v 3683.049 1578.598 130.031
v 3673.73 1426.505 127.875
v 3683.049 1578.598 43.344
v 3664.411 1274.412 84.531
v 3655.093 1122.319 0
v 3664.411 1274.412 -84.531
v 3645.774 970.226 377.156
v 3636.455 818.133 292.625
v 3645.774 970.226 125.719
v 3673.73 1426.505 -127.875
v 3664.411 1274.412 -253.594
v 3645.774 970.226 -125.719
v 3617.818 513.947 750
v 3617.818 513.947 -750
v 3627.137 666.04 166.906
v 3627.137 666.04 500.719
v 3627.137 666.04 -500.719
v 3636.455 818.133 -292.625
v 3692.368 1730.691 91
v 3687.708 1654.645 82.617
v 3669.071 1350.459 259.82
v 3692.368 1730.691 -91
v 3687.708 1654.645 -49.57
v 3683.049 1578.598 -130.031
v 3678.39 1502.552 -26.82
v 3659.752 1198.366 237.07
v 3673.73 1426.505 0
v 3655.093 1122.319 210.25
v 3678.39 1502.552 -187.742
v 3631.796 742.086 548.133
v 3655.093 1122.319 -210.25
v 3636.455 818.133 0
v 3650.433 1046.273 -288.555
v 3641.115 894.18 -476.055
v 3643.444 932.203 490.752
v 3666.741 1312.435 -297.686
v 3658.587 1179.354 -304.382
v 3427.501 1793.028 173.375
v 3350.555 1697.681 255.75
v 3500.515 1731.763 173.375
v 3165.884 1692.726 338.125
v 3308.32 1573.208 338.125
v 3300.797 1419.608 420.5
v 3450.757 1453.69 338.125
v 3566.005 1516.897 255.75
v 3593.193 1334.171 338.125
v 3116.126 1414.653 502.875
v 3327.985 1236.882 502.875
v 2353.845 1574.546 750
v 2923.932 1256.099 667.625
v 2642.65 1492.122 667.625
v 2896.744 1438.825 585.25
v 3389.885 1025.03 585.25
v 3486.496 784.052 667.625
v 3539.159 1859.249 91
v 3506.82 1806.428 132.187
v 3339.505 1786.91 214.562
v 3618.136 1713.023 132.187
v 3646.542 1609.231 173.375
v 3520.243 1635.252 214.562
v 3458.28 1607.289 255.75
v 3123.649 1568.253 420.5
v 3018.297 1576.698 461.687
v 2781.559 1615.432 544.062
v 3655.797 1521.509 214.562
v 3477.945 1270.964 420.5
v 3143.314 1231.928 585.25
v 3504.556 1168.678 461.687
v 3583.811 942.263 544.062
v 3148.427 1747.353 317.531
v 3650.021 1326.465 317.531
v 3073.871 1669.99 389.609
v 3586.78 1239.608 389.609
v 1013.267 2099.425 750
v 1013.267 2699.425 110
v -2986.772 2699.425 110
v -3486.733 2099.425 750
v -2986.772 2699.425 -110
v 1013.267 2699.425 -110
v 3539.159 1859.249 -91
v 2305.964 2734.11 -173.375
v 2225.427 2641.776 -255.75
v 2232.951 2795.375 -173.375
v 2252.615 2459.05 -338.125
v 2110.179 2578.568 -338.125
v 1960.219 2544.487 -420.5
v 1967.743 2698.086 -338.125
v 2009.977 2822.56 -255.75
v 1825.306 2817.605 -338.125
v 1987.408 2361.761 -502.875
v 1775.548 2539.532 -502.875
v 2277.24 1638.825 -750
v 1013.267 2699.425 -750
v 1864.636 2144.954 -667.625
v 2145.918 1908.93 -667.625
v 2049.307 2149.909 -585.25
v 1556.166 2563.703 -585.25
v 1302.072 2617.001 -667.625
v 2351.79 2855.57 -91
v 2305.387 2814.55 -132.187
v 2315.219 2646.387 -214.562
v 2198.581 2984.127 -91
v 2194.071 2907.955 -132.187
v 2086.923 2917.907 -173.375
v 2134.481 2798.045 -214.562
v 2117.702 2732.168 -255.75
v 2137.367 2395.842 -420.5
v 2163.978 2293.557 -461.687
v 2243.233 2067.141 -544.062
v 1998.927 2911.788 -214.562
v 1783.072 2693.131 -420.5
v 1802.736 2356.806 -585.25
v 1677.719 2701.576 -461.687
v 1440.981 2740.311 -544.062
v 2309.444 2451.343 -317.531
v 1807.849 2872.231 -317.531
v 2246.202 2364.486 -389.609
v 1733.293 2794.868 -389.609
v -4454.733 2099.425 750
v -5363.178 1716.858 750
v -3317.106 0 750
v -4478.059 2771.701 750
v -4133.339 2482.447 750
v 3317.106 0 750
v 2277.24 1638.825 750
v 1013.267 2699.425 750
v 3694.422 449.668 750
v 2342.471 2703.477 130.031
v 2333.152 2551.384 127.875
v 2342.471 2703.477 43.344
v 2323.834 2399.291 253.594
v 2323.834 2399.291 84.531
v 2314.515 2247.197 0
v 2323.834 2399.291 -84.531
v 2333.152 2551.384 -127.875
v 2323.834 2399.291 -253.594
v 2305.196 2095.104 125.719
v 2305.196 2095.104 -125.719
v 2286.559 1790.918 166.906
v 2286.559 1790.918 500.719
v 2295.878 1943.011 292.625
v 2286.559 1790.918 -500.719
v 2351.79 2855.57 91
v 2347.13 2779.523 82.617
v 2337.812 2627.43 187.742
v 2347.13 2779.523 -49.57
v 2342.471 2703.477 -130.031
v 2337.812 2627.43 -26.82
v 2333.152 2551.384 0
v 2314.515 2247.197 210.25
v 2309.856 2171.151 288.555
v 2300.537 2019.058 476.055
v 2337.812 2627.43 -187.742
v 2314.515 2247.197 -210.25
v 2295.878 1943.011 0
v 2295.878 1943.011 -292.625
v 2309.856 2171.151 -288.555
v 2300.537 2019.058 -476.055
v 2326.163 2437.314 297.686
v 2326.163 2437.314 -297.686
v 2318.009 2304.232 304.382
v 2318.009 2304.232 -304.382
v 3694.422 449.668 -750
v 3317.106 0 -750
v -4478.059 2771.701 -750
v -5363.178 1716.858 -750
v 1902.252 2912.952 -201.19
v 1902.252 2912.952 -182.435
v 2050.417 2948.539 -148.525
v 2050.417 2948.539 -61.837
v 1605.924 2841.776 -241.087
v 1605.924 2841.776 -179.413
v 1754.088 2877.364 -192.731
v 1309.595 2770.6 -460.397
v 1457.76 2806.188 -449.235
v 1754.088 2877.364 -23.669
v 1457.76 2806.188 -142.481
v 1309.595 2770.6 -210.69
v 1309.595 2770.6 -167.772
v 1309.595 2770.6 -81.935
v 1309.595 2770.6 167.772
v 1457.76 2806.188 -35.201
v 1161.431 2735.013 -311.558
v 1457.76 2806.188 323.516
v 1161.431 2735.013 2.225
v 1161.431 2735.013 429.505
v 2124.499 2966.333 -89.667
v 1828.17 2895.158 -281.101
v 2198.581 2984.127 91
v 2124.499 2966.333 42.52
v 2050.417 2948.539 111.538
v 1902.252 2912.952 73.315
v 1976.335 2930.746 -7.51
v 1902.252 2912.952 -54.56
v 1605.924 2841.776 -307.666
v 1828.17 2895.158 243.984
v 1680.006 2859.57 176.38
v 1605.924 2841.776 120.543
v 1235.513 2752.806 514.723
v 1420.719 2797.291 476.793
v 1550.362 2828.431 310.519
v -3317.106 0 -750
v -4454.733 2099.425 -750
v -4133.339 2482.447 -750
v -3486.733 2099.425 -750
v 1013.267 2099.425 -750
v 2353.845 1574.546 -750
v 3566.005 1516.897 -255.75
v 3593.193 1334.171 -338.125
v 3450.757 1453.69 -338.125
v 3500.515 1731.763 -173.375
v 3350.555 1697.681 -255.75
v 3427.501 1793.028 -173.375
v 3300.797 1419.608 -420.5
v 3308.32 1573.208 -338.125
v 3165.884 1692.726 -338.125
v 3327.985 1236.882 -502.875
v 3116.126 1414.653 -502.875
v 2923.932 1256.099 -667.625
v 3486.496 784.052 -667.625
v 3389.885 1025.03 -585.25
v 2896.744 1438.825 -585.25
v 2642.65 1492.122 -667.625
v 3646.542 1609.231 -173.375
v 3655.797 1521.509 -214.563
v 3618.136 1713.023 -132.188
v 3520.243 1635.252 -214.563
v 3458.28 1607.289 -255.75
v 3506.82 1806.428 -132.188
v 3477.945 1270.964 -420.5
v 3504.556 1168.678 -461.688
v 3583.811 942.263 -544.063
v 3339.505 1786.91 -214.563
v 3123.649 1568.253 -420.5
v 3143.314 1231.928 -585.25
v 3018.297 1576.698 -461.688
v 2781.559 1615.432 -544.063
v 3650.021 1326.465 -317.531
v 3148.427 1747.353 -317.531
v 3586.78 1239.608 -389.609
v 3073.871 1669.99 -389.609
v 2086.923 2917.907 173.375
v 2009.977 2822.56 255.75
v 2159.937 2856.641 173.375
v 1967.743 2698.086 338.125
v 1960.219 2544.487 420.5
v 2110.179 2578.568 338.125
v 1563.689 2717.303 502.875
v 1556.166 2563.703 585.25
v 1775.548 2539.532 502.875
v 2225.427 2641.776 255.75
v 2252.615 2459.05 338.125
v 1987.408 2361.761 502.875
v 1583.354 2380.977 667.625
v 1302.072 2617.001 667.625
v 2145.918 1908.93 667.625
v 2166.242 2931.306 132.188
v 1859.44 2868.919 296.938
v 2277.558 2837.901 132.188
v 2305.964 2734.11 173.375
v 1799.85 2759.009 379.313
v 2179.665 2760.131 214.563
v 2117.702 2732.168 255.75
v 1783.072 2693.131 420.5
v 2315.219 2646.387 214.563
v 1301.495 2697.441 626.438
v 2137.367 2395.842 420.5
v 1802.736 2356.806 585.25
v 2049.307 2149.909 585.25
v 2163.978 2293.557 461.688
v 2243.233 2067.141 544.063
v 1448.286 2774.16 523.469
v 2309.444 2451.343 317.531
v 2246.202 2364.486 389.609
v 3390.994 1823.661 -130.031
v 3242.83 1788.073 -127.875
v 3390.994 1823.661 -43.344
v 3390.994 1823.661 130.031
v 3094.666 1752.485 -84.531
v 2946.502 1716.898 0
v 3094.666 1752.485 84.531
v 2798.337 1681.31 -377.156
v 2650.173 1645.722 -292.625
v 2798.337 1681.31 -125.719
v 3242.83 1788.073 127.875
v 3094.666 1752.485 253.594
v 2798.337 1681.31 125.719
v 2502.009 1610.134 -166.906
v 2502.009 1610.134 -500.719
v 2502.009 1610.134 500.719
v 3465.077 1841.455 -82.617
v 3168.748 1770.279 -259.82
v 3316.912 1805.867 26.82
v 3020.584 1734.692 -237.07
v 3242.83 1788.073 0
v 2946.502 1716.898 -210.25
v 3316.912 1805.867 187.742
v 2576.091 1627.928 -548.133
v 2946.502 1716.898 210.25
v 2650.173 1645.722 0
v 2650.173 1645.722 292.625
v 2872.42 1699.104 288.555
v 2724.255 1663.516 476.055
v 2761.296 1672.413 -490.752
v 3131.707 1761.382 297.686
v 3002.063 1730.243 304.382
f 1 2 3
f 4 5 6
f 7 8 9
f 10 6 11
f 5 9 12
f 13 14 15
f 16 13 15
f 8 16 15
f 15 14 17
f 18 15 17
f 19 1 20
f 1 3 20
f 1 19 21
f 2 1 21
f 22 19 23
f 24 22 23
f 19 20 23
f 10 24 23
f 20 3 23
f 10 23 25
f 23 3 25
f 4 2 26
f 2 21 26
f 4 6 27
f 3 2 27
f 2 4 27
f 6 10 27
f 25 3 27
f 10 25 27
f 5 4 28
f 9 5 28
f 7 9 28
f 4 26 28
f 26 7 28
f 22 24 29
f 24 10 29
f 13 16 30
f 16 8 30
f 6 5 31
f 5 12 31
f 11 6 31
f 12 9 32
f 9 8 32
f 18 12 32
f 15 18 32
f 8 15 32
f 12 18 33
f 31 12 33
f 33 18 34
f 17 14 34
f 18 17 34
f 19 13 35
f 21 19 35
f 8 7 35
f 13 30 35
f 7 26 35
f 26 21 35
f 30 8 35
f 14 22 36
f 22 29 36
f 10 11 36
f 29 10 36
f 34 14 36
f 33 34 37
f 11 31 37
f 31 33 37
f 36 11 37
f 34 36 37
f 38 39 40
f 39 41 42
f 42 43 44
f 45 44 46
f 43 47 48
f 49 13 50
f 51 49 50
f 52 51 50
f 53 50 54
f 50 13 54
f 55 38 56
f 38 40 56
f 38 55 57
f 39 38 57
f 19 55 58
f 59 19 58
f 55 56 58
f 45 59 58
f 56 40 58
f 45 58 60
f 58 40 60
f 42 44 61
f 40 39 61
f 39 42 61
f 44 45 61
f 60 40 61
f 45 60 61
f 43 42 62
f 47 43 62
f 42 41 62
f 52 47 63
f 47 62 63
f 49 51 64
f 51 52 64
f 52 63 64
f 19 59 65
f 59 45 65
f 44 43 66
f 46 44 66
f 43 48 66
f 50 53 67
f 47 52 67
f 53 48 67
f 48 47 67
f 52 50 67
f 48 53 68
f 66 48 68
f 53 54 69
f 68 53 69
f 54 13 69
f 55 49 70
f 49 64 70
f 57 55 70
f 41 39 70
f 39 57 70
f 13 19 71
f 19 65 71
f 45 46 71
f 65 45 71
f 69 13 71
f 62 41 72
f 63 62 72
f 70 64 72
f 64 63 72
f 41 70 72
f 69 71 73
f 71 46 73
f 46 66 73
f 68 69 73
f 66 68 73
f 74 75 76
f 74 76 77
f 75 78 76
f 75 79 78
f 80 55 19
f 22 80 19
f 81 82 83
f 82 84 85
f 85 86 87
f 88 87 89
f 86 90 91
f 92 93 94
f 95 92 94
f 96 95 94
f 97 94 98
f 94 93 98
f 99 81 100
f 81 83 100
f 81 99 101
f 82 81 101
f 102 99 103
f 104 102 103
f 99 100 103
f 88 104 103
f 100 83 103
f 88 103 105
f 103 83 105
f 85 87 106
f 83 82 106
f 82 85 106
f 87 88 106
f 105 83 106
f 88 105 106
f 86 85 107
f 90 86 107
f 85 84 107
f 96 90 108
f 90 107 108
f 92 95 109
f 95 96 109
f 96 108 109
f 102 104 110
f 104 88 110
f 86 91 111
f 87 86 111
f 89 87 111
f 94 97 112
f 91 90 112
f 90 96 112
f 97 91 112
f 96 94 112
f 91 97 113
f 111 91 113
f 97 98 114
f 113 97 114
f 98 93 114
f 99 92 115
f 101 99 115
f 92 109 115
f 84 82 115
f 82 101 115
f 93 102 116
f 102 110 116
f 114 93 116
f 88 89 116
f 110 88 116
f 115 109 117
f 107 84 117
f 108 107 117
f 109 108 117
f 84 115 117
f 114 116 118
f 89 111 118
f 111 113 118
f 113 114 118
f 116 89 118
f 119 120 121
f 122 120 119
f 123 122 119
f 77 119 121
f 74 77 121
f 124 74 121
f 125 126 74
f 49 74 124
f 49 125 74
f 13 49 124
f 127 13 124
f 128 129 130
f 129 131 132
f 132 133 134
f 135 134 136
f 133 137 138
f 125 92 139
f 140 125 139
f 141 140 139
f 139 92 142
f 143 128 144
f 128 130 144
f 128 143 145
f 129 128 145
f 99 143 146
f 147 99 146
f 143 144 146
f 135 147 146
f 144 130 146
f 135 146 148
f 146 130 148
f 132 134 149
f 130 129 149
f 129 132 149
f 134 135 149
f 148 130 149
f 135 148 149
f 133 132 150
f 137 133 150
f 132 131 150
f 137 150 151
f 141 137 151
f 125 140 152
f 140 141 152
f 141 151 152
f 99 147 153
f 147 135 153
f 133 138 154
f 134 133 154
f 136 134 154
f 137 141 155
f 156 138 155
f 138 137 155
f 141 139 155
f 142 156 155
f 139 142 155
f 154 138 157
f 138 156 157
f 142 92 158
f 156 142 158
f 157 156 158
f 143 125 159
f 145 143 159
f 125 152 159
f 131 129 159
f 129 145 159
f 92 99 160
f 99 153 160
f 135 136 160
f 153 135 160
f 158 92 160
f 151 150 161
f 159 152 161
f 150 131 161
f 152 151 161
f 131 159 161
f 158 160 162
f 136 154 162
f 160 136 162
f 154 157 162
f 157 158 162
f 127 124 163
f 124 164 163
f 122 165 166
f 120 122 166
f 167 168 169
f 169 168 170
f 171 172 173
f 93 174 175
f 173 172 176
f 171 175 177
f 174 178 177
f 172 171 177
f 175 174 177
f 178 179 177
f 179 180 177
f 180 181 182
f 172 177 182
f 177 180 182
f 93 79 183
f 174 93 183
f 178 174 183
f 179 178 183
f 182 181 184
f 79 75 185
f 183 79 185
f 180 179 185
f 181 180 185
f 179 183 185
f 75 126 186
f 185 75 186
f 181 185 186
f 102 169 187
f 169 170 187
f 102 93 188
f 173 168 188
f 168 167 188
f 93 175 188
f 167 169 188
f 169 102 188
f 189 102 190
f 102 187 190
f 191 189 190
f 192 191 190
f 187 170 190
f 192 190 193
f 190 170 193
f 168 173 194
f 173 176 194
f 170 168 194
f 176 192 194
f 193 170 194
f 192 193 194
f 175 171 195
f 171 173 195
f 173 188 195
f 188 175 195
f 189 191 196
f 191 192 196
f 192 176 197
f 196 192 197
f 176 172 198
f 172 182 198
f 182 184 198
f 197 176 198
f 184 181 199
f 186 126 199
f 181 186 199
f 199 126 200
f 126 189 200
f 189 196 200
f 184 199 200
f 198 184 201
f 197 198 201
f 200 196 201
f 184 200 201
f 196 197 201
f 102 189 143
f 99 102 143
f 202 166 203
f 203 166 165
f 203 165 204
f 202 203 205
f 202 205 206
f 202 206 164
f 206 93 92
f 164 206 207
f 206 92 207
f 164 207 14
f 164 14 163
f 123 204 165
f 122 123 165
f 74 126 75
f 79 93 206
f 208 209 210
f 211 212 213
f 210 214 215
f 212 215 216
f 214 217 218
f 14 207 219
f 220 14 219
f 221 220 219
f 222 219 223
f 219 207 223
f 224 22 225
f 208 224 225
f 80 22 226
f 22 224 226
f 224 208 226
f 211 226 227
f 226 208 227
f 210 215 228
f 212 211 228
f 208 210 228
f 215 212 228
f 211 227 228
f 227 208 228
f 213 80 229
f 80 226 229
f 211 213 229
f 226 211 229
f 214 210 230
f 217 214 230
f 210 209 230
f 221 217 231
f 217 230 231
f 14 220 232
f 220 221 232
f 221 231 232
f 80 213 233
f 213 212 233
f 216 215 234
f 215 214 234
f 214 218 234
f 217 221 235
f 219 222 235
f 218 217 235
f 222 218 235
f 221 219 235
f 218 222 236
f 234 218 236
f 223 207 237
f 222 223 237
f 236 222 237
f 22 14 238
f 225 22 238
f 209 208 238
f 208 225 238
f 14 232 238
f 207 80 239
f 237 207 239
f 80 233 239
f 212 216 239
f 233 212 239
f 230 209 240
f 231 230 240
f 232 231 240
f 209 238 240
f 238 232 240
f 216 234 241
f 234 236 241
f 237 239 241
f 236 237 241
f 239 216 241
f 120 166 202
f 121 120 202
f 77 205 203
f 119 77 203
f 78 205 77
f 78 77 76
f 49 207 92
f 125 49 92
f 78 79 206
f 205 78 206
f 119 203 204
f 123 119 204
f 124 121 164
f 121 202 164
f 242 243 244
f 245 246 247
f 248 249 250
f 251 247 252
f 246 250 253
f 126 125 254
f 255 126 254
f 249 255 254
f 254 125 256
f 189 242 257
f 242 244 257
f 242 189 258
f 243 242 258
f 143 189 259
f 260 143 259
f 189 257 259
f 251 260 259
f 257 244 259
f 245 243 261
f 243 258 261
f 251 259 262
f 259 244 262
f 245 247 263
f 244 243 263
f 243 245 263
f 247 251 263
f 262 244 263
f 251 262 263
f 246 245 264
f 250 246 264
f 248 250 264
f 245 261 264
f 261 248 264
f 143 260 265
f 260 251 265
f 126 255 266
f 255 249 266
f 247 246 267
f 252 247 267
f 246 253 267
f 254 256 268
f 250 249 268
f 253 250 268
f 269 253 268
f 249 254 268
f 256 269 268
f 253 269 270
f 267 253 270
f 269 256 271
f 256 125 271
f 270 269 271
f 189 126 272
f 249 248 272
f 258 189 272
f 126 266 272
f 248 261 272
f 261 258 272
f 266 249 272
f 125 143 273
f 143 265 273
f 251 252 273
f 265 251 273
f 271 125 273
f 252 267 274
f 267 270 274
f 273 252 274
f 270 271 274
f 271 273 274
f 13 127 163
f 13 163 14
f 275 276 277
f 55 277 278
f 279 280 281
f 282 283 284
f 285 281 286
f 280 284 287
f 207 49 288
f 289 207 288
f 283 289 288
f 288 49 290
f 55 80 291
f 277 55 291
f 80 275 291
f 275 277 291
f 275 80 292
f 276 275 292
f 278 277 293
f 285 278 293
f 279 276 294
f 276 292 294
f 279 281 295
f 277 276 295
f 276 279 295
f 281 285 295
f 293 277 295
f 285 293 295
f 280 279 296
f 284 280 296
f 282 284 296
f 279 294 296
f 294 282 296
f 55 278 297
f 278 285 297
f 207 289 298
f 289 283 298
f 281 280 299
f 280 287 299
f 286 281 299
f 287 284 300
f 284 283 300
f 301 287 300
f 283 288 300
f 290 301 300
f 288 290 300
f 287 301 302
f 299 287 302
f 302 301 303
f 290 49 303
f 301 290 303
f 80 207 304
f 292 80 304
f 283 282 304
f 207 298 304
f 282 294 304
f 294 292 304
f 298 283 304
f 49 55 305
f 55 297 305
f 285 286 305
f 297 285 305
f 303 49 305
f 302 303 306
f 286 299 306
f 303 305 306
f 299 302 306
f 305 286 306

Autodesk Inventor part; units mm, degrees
ref_plane "YZ Plane" through (0, 0, 0) normal (1, 0, 0) x (0, 1, 0)
ref_plane "XZ Plane" through (0, 0, 0) normal (0, 1, 0) x (-1, 0, 0)
ref_plane "XY Plane" through (0, 0, 0) normal (0, 0, 1) x (1, 0, 0)
sketch "Sketch1" plane through (0, 0, 0) normal (0, 0, 1) x (1, 0, 0)
  line L0 (-3317.106, 0) -> (3317.106, 0)
  line L1 (3317.106, 0) -> (3694.4224, 449.6681)
  line L2 (3694.4224, 449.6681) -> (1013.2668, 2699.4247)
  line L3 (1013.2668, 2699.4247) -> (1013.2668, 2099.4247)
  line L4 (1013.2668, 2099.4247) -> (-4454.7332, 2099.4247)
  line L5 (-4454.7332, 2099.4247) -> (-4133.3394, 2482.4469)
  line L6 (-4133.3394, 2482.4469) -> (-4478.0594, 2771.7014)
  line L7 (-4478.0594, 2771.7014) -> (-5363.1779, 1716.8582)
  line L8 (-5363.1779, 1716.8582) -> (-3317.0732, -0.0275)
  point P0 (0, 0)
  point P1 (0, 0)
  dimension "d19" = 587
  dimension "d20" = 130
  dimension "d21" = 3500
  dimension "d22" = 90
  dimension "d28" = 600
  dimension "d29" = 50
  dimension "d30" = 5468
  dimension "d31" = 90
  dimension "d32" = 500
  dimension "d33" = 50
  dimension "d34" = 450
  dimension "d35" = 90
  dimension "d36" = 1377
  dimension "d37" = 90
  dimension "d38" = 2671
  dimension "d39" = 90
  dimension "d40" = 6634.2121
  dimension "d41" = 140
extrude "Extrusion1" add sketch "Sketch1" along normal mid plane 1500
sketch "Sketch2" plane through (1013.2668, 2699.4247, 750) normal (0.6428, 0.766, 0) x (0.766, -0.6428, 0)
  line L0 (3400, 0) -> (1750, 0)
  line L1 (1750, 0) -> (1750, 1500)
  line L2 (1750, 1500) -> (3400, 1500)
  line L3 (3400, 1500) -> (3400, 0)
  line L4 (0, 1500) -> (0, 0) projected
  line L5 (3500, 0) -> (0, 0) projected
  line L6 (3500, 1500) -> (3500, 0) projected
  line L7 (0, 1500) -> (3500, 1500) projected
  point P0 (958.9494, 750)
  point P1 (3400, 750)
  point P2 (3500, 750)
  dimension "d44" = 1650
  dimension "d45" = 1500
  dimension "d46" = 100
ref_plane "Work Plane1" through (1643.1987, 3450.1483, 750) normal (0.6428, 0.766, 0) x (0.766, -0.6428, 0)
sketch "Sketch3" plane through (1643.1987, 3450.1483, 750) normal (0.6428, 0.766, 0) x (0.766, -0.6428, 0)
  line L0 (1750, 0) -> (1750, 1500) construction
  line L1 (1750, 1500) -> (3400, 1500) construction
  line L2 (3400, 1500) -> (3400, 0) construction
  line L3 (3400, 0) -> (1750, 0) construction
  line L4 (1750, 750) -> (3400, 750) construction
  line L5 (2575, 0) -> (2575, 1500) construction
  line L6 (2475, 659) -> (2675, 659)
  line L7 (2675, 659) -> (2675, 841)
  line L8 (2675, 841) -> (2475, 841)
  line L9 (2475, 841) -> (2475, 659)
  line L10 (2475, 659) -> (2675, 841) construction
  point P0 (958.9494, 750)
  point P1 (2575, 750)
  dimension "d48" = 182
  dimension "d49" = 200
loft "Loft1" add profiles "Sketch3", "Sketch2" contours all / L0 L1 L2 L3
sketch "Sketch4" plane through (1013.2668, 2699.4247, 750) normal (0.6428, 0.766, 0) x (0.766, -0.6428, 0)
  line L0 (0, 0) -> (1650, 0)
  line L1 (1650, 0) -> (1650, 1500)
  line L2 (1650, 1500) -> (0, 1500)
  line L3 (0, 1500) -> (0, 0)
  line L4 (1750, 0) -> (1750, 1500) projected
  line L5 (0, 1500) -> (1750, 1500) projected
  line L6 (0, 1500) -> (0, 0) projected
  line L7 (1750, 0) -> (0, 0) projected
  point P0 (958.9494, 750)
  point P1 (1650, 750)
  point P2 (1750, 750)
  dimension "d54" = 1650
  dimension "d55" = 1500
  dimension "d56" = 100
sketch "Sketch5" plane through (1643.1987, 3450.1483, 750) normal (0.6428, 0.766, 0) x (0.766, -0.6428, 0)
  line L0 (0, 1500) -> (1750, 1500) construction
  line L1 (0, 1500) -> (0, 0) construction
  line L2 (1650, 0) -> (1650, 1500) construction
  line L3 (0, 0) -> (1650, 0) construction
  line L4 (1650, 0) -> (0, 1500) construction
  line L5 (0, 0) -> (1650, 1500) construction
  line L6 (725, 659) -> (925, 659)
  line L7 (925, 659) -> (925, 841)
  line L8 (925, 841) -> (725, 841)
  line L9 (725, 841) -> (725, 659)
  line L10 (925, 659) -> (725, 841) construction
  point P0 (958.9494, 750)
  point P1 (825, 750)
  dimension "d59" = 200
  dimension "d60" = 182
loft "Loft2" add profiles "Sketch5", "Sketch4" contours all / L3 L2 L1 L0
sketch "Sketch6" plane through (1013.2668, 2099.4247, -750) normal (-1, 0, 0) x (0, 0, 1)
  line L0 (0, 0) -> (1500, 0) projected
  line L1 (0, 0) -> (0, 600) projected
  line L2 (0, 600) -> (1500, 600) projected
  line L3 (1500, 600) -> (1500, 0) projected
  line L4 (860, 600) -> (640, 600)
  line L5 (1500, 0) -> (0, 0)
  line L6 (860, 600) -> (1500, 0)
  line L7 (640, 600) -> (0, 0)
  point P0 (750, -2099.4247)
  point P1 (750, 600)
  point P2 (640, 600)
  point P3 (860, 600)
  dimension "d65" = 220
extrude "Extrusion2" add sketch "Sketch6" along normal blind 4500 contours L7 L2 L6 L0
sketch "Sketch7" plane through (-3486.7332, 2099.4247, -750) normal (-1, 0, 0) x (0, 0, 1)
  point P0 (750, -2099.4247)
sketch "Sketch8" plane through (0, 0, 750) normal (0, 0, 1) x (1, 0, 0)
  line L0 (1013.2668, 2699.4247) -> (1013.2668, 2099.4247) projected
  line L1 (1013.2668, 2699.4247) -> (-3486.7332, 2699.4247) projected
  line L2 (-3486.7332, 2099.4247) -> (-3486.7332, 2699.4247) projected
  line L3 (1013.2668, 2099.4247) -> (-3486.7332, 2099.4247) projected
  line L4 (-3486.7332, 2099.4247) -> (-2986.7722, 2699.4247)
  point P0 (0, 0)
  dimension "d69" = 781
extrude "Extrusion3" cut sketch "Sketch8" against normal through all contours L4 L2 L1
properties part number "МОО 000 Пример емкости"
